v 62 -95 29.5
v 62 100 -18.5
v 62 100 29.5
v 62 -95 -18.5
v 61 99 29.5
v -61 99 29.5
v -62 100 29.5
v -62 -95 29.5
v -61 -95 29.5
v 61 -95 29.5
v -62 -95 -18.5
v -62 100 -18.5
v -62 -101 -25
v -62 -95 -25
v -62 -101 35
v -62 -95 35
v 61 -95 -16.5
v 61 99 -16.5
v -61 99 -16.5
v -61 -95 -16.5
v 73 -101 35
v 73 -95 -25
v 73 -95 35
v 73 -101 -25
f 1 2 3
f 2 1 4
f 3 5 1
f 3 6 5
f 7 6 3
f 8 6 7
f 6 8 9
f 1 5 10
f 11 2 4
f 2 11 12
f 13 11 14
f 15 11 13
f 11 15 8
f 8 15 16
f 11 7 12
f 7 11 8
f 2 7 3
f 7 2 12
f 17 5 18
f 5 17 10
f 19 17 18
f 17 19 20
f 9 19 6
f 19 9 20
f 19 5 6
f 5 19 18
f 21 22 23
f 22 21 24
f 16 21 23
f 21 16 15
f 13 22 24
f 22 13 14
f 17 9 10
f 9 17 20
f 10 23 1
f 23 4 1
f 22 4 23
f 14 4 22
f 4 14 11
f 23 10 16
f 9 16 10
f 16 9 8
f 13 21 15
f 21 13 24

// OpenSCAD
//ForPrint();
ForDisplay();

module ForDisplay(){
	//#cube([124,200,48],center=true); // Space for drawer
	
	FrontPlate();
	translate([0,0,5.5]) Box();
	//rotate([0,0,90]) translate([82,33,-13]) Rail();
}

module ForPrint(){
	translate([0,-70,0]) FrontPlate();
	translate([82,33,-13]) Rail();
	mirror([180,0,0]) translate([82,33,-13]) Rail();
	translate([0,40,0]) translate([0,103,-10])  BackRail();	
}

module FrontPlate(){
		translate([5.5,-98,5]) cube([135,6,60],center=true); //Front plate
	
}
module Box(){
	difference(){
		cube([124,200,48],center=true);
		translate([0,0,2]) cube([122,198,48],center=true);
	}
}

module BackRail(){

	cube([157,10,5], center=true);
	rotate([0,-90,90]) translate([3,-58.5,0]) GlueSpot();
	mirror([180,0,0]) rotate([0,-90,90]) translate([3,-58.5,0]) GlueSpot();

}

module Rail(){
//	#translate([0,0,-5]) cube([55,55,55]);
	cube([5,150,10],center=true); //Virtical
	translate([-2.5,0,-3]) cube([10,150,5],center=true); //Horizontal
	
	translate([0,-40,25]) rotate([45,0,0]) CompressFit();
	translate([0,-15,25]) rotate([45,0,0]) CompressFit();
	translate([0,15,25]) rotate([45,0,0]) CompressFit();
	translate([0,45,25]) rotate([45,0,0]) CompressFit();
	
	translate([3,-55,-2.5]) GlueSpot();
	
//Stop Block
 
	difference(){
		union(){
			translate([-5,25,10]) cube([4,10,30],center=true); //Virtical
			rotate([90,0,0]) translate([-5,29.5,-18]) cube([4,6,9],center=true);  // Horizontal 
			translate([-5,22.5,25]) rotate([0,90,0]) cylinder(h=4,d=15,center=true); //Outside
			translate([-5,13.5,29.5]) rotate([0,90,0]) cylinder(h=4,d=6,center=true); //End
		}
	translate([-5,10,12]) cube([6,20,29],center=true); // Cut Out
	}
	scale([.8,.48,.80]) translate([-3.25,61.5,0])  GlueSpot();

	//
	
	translate([-10,65,-3]) cube([20,20,5],center=true); //Back Block
	
	difference(){
		translate([0,55,-3]) cylinder(h=5,r=20,center=true);
		translate([10,55,-3]) cube([20,40,7],center=true);
	}
}

module  CompressFit(){
	cube([5,2,70],center=true);
	translate([0,0,33]) rotate([0,90,0]) cylinder(h=5,d=5,center=true);
}

module GlueSpot(){
rotate([0,90,0])	
	translate([3,0,0])
		 difference(){
			union(){
				translate([0,0,-3]) cylinder(h=5,r=20,center=true);
				translate([-10,-10,-3]) cube([20,20,5],center=true);
			}
			translate([10,0,-3]) cube([20,40,7],center=true);
		}
}
